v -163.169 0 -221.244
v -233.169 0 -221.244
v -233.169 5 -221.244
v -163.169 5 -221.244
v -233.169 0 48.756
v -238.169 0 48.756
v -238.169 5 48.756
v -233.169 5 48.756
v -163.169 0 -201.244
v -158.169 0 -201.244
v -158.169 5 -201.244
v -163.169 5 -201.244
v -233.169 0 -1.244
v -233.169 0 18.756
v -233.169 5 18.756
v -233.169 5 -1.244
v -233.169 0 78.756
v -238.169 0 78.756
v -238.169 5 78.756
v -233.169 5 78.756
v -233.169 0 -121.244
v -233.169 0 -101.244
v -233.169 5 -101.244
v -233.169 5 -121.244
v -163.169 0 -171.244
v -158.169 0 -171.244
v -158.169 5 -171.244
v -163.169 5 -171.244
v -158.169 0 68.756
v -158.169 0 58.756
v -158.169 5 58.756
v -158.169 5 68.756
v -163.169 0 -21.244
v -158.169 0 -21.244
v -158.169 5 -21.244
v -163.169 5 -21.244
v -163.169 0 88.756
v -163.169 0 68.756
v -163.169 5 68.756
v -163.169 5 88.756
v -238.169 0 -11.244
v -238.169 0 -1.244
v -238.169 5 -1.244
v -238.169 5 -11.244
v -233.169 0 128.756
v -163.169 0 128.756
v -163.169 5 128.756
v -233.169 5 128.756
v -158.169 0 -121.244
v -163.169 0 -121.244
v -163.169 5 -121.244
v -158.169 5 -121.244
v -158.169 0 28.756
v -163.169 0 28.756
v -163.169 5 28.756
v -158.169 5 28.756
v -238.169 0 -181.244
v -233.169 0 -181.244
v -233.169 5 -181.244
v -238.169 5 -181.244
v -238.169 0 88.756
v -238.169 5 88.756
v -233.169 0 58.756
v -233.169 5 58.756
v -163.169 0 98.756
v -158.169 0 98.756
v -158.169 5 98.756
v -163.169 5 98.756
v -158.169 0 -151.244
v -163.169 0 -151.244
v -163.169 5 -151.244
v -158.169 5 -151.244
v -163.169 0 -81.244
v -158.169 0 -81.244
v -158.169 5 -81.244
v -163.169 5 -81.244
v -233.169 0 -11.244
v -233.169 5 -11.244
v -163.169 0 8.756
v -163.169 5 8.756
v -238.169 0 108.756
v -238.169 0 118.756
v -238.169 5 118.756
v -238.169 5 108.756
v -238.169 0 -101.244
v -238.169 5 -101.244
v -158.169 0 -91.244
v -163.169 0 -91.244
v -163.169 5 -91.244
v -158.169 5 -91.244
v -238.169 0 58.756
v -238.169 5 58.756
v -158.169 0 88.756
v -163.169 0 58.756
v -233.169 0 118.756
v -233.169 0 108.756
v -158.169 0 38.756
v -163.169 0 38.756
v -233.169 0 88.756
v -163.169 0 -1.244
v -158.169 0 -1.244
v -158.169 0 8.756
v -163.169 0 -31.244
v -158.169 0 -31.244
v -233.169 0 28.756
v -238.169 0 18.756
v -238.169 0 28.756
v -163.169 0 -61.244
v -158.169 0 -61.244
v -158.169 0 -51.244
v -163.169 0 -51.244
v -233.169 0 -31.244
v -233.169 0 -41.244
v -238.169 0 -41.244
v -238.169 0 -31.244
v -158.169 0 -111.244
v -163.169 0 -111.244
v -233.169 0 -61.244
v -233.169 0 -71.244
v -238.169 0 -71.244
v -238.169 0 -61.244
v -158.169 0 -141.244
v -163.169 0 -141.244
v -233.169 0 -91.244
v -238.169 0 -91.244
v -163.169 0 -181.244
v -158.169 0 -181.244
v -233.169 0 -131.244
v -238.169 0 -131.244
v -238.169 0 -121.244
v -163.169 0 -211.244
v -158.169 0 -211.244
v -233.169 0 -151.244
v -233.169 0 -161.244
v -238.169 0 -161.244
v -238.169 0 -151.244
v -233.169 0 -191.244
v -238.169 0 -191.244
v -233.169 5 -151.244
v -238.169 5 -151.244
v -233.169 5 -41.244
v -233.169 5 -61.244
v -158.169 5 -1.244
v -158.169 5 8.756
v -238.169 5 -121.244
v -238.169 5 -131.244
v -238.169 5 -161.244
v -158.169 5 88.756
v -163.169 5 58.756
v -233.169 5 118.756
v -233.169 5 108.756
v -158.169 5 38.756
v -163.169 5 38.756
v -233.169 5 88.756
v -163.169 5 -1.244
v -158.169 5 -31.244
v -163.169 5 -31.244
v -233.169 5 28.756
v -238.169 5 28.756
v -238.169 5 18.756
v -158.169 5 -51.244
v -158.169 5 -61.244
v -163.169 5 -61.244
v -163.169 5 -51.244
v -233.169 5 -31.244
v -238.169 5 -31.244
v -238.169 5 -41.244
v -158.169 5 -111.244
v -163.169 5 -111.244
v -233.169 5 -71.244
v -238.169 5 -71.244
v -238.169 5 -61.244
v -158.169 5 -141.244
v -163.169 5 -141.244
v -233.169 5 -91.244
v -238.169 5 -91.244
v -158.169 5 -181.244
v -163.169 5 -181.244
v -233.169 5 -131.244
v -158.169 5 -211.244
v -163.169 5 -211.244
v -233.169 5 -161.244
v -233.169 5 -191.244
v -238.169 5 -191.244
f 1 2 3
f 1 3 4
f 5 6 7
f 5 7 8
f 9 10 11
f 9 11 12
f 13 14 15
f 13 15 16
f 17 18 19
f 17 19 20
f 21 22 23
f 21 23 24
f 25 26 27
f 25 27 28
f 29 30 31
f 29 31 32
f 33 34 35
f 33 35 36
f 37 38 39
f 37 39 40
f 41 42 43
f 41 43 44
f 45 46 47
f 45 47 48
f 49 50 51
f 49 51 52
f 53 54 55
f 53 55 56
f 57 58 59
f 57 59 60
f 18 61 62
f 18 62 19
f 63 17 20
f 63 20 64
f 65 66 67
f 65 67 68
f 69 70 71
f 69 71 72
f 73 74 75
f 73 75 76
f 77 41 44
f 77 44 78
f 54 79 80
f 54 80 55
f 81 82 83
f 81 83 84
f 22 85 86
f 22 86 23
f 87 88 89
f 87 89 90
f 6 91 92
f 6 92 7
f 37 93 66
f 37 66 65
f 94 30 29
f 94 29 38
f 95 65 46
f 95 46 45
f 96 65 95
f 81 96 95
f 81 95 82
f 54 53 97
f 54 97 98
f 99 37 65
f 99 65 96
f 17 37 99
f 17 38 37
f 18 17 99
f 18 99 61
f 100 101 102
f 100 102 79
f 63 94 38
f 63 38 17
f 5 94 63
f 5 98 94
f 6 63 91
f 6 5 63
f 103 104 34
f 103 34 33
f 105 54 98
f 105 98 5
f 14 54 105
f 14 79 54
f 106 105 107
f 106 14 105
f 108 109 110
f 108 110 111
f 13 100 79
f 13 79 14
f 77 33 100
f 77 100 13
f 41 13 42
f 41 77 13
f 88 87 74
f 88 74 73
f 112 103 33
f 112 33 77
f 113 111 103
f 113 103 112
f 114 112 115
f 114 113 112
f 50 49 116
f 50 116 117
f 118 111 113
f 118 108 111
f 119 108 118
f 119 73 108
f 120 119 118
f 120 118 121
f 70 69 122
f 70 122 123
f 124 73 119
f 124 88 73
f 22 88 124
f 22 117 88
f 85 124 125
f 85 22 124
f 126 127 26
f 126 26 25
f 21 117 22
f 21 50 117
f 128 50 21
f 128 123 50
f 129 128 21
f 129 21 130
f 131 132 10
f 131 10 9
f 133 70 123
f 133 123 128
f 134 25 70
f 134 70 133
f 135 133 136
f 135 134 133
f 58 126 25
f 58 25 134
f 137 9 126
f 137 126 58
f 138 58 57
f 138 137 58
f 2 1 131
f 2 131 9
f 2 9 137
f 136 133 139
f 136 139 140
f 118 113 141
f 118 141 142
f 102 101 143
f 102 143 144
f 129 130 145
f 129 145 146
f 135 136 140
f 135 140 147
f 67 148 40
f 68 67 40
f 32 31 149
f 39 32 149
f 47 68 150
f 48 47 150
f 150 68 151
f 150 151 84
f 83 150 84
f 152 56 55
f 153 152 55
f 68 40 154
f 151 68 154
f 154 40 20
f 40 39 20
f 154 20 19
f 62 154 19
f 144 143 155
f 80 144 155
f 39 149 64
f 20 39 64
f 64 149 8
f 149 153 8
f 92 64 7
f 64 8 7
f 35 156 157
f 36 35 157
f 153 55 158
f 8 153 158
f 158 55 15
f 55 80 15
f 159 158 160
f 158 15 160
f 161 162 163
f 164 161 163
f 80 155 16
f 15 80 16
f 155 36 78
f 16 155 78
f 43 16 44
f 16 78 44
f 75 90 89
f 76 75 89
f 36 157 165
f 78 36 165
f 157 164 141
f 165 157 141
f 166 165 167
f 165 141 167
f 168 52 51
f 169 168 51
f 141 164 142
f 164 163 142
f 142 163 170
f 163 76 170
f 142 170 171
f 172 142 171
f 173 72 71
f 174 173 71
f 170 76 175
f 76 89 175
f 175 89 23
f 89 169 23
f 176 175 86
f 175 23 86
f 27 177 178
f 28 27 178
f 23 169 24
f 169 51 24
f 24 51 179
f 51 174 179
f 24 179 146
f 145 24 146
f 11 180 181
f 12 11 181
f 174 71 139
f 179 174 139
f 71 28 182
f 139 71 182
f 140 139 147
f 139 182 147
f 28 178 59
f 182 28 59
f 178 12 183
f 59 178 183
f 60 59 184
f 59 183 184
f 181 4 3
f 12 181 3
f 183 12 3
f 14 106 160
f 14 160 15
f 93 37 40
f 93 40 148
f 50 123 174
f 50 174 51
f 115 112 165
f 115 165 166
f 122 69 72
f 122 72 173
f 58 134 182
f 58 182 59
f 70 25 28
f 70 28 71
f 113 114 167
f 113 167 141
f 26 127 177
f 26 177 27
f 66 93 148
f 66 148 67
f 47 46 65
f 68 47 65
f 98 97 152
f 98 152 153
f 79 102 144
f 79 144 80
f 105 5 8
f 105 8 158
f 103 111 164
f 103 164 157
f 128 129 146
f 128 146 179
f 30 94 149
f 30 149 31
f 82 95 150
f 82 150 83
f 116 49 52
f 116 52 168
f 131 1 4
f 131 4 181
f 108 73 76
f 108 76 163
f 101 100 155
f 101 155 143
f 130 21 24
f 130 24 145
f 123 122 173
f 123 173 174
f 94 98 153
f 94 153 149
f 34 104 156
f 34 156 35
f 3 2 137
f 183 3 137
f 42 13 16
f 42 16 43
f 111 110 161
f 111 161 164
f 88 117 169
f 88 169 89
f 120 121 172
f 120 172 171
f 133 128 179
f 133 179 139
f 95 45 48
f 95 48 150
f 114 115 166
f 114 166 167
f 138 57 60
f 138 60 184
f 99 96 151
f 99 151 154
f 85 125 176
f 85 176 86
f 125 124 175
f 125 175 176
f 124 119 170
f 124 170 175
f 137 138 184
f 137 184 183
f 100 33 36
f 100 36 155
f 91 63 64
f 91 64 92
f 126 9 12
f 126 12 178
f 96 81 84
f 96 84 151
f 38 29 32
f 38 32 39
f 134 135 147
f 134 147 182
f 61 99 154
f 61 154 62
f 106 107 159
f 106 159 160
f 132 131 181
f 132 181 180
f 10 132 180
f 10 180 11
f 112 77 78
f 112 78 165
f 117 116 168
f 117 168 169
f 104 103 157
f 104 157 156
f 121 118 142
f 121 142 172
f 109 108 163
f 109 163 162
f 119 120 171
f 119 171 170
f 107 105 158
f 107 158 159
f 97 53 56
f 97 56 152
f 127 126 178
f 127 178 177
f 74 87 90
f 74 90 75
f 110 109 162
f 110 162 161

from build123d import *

# Parameters (mm, degrees)
BOSS_EXTRUDE1_DEPTH = 5


with BuildPart() as part:
    # Sketch1 → Boss-Extrude1 (new body)
    with BuildSketch(Plane(origin=(0, 0, 0), x_dir=(1, 0, 0), z_dir=(0, 1, 0))):
        Polygon((-238.169070324, -88.755561118), (-238.169070324, -78.755561118), (-233.169070324, -78.755561118), (-233.169070324, -58.755561118), (-238.169070324, -58.755561118), (-238.169070324, -48.755561118), (-233.169070324, -48.755561118), (-233.169070324, -28.755561118), (-238.169070324, -28.755561118), (-238.169070324, -18.755561118), (-233.169070324, -18.755561118), (-233.169070324, 1.244438882), (-238.169070324, 1.244438882), (-238.169070324, 11.244438882), (-233.169070324, 11.244438882), (-233.169070324, 31.244438882), (-238.169070324, 31.244438882), (-238.169070324, 41.244438882), (-233.169070324, 41.244438882), (-233.169070324, 61.244438882), (-238.169070324, 61.244438882), (-238.169070324, 71.244438882), (-233.169070324, 71.244438882), (-233.169070324, 91.244438882), (-238.169070324, 91.244438882), (-238.169070324, 101.244438882), (-233.169070324, 101.244438882), (-233.169070324, 121.244438882), (-238.169070324, 121.244438882), (-238.169070324, 131.244438882), (-233.169070324, 131.244438882), (-233.169070324, 151.244438882), (-238.169070324, 151.244438882), (-238.169070324, 161.244438882), (-233.169070324, 161.244438882), (-233.169070324, 181.244438882), (-238.169070324, 181.244438882), (-238.169070324, 191.244438882), (-233.169070324, 191.244438882), (-233.169070324, 211.244438882), (-233.169070324, 221.244438882), (-163.169070324, 221.244438882), (-163.169070324, 211.244438882), (-158.169070324, 211.244438882), (-158.169070324, 201.244438882), (-163.169070324, 201.244438882), (-163.169070324, 181.244438882), (-158.169070324, 181.244438882), (-158.169070324, 171.244438882), (-163.169070324, 171.244438882), (-163.169070324, 151.244438882), (-158.169070324, 151.244438882), (-158.169070324, 141.244438882), (-163.169070324, 141.244438882), (-163.169070324, 121.244438882), (-158.169070324, 121.244438882), (-158.169070324, 111.244438882), (-163.169070324, 111.244438882), (-163.169070324, 91.244438882), (-158.169070324, 91.244438882), (-158.169070324, 81.244438882), (-163.169070324, 81.244438882), (-163.169070324, 61.244438882), (-158.169070324, 61.244438882), (-158.169070324, 51.244438882), (-163.169070324, 51.244438882), (-163.169070324, 31.244438882), (-158.169070324, 31.244438882), (-158.169070324, 21.244438882), (-163.169070324, 21.244438882), (-163.169070324, 1.244438882), (-158.169070324, 1.244438882), (-158.169070324, -8.755561118), (-163.169070324, -8.755561118), (-163.169070324, -28.755561118), (-158.169070324, -28.755561118), (-158.169070324, -38.755561118), (-163.169070324, -38.755561118), (-163.169070324, -58.755561118), (-158.169070324, -58.755561118), (-158.169070324, -68.755561118), (-163.169070324, -68.755561118), (-163.169070324, -88.755561118), (-158.169070324, -88.755561118), (-158.169070324, -98.755561118), (-163.169070324, -98.755561118), (-163.169070324, -118.755561118), (-163.169070324, -128.755561118), (-233.169070324, -128.755561118), (-233.169070324, -118.755561118), (-238.169070324, -118.755561118), (-238.169070324, -108.755561118), (-233.169070324, -108.755561118), (-233.169070324, -88.755561118), align=None)
    extrude(amount=BOSS_EXTRUDE1_DEPTH)


solid = part.part
